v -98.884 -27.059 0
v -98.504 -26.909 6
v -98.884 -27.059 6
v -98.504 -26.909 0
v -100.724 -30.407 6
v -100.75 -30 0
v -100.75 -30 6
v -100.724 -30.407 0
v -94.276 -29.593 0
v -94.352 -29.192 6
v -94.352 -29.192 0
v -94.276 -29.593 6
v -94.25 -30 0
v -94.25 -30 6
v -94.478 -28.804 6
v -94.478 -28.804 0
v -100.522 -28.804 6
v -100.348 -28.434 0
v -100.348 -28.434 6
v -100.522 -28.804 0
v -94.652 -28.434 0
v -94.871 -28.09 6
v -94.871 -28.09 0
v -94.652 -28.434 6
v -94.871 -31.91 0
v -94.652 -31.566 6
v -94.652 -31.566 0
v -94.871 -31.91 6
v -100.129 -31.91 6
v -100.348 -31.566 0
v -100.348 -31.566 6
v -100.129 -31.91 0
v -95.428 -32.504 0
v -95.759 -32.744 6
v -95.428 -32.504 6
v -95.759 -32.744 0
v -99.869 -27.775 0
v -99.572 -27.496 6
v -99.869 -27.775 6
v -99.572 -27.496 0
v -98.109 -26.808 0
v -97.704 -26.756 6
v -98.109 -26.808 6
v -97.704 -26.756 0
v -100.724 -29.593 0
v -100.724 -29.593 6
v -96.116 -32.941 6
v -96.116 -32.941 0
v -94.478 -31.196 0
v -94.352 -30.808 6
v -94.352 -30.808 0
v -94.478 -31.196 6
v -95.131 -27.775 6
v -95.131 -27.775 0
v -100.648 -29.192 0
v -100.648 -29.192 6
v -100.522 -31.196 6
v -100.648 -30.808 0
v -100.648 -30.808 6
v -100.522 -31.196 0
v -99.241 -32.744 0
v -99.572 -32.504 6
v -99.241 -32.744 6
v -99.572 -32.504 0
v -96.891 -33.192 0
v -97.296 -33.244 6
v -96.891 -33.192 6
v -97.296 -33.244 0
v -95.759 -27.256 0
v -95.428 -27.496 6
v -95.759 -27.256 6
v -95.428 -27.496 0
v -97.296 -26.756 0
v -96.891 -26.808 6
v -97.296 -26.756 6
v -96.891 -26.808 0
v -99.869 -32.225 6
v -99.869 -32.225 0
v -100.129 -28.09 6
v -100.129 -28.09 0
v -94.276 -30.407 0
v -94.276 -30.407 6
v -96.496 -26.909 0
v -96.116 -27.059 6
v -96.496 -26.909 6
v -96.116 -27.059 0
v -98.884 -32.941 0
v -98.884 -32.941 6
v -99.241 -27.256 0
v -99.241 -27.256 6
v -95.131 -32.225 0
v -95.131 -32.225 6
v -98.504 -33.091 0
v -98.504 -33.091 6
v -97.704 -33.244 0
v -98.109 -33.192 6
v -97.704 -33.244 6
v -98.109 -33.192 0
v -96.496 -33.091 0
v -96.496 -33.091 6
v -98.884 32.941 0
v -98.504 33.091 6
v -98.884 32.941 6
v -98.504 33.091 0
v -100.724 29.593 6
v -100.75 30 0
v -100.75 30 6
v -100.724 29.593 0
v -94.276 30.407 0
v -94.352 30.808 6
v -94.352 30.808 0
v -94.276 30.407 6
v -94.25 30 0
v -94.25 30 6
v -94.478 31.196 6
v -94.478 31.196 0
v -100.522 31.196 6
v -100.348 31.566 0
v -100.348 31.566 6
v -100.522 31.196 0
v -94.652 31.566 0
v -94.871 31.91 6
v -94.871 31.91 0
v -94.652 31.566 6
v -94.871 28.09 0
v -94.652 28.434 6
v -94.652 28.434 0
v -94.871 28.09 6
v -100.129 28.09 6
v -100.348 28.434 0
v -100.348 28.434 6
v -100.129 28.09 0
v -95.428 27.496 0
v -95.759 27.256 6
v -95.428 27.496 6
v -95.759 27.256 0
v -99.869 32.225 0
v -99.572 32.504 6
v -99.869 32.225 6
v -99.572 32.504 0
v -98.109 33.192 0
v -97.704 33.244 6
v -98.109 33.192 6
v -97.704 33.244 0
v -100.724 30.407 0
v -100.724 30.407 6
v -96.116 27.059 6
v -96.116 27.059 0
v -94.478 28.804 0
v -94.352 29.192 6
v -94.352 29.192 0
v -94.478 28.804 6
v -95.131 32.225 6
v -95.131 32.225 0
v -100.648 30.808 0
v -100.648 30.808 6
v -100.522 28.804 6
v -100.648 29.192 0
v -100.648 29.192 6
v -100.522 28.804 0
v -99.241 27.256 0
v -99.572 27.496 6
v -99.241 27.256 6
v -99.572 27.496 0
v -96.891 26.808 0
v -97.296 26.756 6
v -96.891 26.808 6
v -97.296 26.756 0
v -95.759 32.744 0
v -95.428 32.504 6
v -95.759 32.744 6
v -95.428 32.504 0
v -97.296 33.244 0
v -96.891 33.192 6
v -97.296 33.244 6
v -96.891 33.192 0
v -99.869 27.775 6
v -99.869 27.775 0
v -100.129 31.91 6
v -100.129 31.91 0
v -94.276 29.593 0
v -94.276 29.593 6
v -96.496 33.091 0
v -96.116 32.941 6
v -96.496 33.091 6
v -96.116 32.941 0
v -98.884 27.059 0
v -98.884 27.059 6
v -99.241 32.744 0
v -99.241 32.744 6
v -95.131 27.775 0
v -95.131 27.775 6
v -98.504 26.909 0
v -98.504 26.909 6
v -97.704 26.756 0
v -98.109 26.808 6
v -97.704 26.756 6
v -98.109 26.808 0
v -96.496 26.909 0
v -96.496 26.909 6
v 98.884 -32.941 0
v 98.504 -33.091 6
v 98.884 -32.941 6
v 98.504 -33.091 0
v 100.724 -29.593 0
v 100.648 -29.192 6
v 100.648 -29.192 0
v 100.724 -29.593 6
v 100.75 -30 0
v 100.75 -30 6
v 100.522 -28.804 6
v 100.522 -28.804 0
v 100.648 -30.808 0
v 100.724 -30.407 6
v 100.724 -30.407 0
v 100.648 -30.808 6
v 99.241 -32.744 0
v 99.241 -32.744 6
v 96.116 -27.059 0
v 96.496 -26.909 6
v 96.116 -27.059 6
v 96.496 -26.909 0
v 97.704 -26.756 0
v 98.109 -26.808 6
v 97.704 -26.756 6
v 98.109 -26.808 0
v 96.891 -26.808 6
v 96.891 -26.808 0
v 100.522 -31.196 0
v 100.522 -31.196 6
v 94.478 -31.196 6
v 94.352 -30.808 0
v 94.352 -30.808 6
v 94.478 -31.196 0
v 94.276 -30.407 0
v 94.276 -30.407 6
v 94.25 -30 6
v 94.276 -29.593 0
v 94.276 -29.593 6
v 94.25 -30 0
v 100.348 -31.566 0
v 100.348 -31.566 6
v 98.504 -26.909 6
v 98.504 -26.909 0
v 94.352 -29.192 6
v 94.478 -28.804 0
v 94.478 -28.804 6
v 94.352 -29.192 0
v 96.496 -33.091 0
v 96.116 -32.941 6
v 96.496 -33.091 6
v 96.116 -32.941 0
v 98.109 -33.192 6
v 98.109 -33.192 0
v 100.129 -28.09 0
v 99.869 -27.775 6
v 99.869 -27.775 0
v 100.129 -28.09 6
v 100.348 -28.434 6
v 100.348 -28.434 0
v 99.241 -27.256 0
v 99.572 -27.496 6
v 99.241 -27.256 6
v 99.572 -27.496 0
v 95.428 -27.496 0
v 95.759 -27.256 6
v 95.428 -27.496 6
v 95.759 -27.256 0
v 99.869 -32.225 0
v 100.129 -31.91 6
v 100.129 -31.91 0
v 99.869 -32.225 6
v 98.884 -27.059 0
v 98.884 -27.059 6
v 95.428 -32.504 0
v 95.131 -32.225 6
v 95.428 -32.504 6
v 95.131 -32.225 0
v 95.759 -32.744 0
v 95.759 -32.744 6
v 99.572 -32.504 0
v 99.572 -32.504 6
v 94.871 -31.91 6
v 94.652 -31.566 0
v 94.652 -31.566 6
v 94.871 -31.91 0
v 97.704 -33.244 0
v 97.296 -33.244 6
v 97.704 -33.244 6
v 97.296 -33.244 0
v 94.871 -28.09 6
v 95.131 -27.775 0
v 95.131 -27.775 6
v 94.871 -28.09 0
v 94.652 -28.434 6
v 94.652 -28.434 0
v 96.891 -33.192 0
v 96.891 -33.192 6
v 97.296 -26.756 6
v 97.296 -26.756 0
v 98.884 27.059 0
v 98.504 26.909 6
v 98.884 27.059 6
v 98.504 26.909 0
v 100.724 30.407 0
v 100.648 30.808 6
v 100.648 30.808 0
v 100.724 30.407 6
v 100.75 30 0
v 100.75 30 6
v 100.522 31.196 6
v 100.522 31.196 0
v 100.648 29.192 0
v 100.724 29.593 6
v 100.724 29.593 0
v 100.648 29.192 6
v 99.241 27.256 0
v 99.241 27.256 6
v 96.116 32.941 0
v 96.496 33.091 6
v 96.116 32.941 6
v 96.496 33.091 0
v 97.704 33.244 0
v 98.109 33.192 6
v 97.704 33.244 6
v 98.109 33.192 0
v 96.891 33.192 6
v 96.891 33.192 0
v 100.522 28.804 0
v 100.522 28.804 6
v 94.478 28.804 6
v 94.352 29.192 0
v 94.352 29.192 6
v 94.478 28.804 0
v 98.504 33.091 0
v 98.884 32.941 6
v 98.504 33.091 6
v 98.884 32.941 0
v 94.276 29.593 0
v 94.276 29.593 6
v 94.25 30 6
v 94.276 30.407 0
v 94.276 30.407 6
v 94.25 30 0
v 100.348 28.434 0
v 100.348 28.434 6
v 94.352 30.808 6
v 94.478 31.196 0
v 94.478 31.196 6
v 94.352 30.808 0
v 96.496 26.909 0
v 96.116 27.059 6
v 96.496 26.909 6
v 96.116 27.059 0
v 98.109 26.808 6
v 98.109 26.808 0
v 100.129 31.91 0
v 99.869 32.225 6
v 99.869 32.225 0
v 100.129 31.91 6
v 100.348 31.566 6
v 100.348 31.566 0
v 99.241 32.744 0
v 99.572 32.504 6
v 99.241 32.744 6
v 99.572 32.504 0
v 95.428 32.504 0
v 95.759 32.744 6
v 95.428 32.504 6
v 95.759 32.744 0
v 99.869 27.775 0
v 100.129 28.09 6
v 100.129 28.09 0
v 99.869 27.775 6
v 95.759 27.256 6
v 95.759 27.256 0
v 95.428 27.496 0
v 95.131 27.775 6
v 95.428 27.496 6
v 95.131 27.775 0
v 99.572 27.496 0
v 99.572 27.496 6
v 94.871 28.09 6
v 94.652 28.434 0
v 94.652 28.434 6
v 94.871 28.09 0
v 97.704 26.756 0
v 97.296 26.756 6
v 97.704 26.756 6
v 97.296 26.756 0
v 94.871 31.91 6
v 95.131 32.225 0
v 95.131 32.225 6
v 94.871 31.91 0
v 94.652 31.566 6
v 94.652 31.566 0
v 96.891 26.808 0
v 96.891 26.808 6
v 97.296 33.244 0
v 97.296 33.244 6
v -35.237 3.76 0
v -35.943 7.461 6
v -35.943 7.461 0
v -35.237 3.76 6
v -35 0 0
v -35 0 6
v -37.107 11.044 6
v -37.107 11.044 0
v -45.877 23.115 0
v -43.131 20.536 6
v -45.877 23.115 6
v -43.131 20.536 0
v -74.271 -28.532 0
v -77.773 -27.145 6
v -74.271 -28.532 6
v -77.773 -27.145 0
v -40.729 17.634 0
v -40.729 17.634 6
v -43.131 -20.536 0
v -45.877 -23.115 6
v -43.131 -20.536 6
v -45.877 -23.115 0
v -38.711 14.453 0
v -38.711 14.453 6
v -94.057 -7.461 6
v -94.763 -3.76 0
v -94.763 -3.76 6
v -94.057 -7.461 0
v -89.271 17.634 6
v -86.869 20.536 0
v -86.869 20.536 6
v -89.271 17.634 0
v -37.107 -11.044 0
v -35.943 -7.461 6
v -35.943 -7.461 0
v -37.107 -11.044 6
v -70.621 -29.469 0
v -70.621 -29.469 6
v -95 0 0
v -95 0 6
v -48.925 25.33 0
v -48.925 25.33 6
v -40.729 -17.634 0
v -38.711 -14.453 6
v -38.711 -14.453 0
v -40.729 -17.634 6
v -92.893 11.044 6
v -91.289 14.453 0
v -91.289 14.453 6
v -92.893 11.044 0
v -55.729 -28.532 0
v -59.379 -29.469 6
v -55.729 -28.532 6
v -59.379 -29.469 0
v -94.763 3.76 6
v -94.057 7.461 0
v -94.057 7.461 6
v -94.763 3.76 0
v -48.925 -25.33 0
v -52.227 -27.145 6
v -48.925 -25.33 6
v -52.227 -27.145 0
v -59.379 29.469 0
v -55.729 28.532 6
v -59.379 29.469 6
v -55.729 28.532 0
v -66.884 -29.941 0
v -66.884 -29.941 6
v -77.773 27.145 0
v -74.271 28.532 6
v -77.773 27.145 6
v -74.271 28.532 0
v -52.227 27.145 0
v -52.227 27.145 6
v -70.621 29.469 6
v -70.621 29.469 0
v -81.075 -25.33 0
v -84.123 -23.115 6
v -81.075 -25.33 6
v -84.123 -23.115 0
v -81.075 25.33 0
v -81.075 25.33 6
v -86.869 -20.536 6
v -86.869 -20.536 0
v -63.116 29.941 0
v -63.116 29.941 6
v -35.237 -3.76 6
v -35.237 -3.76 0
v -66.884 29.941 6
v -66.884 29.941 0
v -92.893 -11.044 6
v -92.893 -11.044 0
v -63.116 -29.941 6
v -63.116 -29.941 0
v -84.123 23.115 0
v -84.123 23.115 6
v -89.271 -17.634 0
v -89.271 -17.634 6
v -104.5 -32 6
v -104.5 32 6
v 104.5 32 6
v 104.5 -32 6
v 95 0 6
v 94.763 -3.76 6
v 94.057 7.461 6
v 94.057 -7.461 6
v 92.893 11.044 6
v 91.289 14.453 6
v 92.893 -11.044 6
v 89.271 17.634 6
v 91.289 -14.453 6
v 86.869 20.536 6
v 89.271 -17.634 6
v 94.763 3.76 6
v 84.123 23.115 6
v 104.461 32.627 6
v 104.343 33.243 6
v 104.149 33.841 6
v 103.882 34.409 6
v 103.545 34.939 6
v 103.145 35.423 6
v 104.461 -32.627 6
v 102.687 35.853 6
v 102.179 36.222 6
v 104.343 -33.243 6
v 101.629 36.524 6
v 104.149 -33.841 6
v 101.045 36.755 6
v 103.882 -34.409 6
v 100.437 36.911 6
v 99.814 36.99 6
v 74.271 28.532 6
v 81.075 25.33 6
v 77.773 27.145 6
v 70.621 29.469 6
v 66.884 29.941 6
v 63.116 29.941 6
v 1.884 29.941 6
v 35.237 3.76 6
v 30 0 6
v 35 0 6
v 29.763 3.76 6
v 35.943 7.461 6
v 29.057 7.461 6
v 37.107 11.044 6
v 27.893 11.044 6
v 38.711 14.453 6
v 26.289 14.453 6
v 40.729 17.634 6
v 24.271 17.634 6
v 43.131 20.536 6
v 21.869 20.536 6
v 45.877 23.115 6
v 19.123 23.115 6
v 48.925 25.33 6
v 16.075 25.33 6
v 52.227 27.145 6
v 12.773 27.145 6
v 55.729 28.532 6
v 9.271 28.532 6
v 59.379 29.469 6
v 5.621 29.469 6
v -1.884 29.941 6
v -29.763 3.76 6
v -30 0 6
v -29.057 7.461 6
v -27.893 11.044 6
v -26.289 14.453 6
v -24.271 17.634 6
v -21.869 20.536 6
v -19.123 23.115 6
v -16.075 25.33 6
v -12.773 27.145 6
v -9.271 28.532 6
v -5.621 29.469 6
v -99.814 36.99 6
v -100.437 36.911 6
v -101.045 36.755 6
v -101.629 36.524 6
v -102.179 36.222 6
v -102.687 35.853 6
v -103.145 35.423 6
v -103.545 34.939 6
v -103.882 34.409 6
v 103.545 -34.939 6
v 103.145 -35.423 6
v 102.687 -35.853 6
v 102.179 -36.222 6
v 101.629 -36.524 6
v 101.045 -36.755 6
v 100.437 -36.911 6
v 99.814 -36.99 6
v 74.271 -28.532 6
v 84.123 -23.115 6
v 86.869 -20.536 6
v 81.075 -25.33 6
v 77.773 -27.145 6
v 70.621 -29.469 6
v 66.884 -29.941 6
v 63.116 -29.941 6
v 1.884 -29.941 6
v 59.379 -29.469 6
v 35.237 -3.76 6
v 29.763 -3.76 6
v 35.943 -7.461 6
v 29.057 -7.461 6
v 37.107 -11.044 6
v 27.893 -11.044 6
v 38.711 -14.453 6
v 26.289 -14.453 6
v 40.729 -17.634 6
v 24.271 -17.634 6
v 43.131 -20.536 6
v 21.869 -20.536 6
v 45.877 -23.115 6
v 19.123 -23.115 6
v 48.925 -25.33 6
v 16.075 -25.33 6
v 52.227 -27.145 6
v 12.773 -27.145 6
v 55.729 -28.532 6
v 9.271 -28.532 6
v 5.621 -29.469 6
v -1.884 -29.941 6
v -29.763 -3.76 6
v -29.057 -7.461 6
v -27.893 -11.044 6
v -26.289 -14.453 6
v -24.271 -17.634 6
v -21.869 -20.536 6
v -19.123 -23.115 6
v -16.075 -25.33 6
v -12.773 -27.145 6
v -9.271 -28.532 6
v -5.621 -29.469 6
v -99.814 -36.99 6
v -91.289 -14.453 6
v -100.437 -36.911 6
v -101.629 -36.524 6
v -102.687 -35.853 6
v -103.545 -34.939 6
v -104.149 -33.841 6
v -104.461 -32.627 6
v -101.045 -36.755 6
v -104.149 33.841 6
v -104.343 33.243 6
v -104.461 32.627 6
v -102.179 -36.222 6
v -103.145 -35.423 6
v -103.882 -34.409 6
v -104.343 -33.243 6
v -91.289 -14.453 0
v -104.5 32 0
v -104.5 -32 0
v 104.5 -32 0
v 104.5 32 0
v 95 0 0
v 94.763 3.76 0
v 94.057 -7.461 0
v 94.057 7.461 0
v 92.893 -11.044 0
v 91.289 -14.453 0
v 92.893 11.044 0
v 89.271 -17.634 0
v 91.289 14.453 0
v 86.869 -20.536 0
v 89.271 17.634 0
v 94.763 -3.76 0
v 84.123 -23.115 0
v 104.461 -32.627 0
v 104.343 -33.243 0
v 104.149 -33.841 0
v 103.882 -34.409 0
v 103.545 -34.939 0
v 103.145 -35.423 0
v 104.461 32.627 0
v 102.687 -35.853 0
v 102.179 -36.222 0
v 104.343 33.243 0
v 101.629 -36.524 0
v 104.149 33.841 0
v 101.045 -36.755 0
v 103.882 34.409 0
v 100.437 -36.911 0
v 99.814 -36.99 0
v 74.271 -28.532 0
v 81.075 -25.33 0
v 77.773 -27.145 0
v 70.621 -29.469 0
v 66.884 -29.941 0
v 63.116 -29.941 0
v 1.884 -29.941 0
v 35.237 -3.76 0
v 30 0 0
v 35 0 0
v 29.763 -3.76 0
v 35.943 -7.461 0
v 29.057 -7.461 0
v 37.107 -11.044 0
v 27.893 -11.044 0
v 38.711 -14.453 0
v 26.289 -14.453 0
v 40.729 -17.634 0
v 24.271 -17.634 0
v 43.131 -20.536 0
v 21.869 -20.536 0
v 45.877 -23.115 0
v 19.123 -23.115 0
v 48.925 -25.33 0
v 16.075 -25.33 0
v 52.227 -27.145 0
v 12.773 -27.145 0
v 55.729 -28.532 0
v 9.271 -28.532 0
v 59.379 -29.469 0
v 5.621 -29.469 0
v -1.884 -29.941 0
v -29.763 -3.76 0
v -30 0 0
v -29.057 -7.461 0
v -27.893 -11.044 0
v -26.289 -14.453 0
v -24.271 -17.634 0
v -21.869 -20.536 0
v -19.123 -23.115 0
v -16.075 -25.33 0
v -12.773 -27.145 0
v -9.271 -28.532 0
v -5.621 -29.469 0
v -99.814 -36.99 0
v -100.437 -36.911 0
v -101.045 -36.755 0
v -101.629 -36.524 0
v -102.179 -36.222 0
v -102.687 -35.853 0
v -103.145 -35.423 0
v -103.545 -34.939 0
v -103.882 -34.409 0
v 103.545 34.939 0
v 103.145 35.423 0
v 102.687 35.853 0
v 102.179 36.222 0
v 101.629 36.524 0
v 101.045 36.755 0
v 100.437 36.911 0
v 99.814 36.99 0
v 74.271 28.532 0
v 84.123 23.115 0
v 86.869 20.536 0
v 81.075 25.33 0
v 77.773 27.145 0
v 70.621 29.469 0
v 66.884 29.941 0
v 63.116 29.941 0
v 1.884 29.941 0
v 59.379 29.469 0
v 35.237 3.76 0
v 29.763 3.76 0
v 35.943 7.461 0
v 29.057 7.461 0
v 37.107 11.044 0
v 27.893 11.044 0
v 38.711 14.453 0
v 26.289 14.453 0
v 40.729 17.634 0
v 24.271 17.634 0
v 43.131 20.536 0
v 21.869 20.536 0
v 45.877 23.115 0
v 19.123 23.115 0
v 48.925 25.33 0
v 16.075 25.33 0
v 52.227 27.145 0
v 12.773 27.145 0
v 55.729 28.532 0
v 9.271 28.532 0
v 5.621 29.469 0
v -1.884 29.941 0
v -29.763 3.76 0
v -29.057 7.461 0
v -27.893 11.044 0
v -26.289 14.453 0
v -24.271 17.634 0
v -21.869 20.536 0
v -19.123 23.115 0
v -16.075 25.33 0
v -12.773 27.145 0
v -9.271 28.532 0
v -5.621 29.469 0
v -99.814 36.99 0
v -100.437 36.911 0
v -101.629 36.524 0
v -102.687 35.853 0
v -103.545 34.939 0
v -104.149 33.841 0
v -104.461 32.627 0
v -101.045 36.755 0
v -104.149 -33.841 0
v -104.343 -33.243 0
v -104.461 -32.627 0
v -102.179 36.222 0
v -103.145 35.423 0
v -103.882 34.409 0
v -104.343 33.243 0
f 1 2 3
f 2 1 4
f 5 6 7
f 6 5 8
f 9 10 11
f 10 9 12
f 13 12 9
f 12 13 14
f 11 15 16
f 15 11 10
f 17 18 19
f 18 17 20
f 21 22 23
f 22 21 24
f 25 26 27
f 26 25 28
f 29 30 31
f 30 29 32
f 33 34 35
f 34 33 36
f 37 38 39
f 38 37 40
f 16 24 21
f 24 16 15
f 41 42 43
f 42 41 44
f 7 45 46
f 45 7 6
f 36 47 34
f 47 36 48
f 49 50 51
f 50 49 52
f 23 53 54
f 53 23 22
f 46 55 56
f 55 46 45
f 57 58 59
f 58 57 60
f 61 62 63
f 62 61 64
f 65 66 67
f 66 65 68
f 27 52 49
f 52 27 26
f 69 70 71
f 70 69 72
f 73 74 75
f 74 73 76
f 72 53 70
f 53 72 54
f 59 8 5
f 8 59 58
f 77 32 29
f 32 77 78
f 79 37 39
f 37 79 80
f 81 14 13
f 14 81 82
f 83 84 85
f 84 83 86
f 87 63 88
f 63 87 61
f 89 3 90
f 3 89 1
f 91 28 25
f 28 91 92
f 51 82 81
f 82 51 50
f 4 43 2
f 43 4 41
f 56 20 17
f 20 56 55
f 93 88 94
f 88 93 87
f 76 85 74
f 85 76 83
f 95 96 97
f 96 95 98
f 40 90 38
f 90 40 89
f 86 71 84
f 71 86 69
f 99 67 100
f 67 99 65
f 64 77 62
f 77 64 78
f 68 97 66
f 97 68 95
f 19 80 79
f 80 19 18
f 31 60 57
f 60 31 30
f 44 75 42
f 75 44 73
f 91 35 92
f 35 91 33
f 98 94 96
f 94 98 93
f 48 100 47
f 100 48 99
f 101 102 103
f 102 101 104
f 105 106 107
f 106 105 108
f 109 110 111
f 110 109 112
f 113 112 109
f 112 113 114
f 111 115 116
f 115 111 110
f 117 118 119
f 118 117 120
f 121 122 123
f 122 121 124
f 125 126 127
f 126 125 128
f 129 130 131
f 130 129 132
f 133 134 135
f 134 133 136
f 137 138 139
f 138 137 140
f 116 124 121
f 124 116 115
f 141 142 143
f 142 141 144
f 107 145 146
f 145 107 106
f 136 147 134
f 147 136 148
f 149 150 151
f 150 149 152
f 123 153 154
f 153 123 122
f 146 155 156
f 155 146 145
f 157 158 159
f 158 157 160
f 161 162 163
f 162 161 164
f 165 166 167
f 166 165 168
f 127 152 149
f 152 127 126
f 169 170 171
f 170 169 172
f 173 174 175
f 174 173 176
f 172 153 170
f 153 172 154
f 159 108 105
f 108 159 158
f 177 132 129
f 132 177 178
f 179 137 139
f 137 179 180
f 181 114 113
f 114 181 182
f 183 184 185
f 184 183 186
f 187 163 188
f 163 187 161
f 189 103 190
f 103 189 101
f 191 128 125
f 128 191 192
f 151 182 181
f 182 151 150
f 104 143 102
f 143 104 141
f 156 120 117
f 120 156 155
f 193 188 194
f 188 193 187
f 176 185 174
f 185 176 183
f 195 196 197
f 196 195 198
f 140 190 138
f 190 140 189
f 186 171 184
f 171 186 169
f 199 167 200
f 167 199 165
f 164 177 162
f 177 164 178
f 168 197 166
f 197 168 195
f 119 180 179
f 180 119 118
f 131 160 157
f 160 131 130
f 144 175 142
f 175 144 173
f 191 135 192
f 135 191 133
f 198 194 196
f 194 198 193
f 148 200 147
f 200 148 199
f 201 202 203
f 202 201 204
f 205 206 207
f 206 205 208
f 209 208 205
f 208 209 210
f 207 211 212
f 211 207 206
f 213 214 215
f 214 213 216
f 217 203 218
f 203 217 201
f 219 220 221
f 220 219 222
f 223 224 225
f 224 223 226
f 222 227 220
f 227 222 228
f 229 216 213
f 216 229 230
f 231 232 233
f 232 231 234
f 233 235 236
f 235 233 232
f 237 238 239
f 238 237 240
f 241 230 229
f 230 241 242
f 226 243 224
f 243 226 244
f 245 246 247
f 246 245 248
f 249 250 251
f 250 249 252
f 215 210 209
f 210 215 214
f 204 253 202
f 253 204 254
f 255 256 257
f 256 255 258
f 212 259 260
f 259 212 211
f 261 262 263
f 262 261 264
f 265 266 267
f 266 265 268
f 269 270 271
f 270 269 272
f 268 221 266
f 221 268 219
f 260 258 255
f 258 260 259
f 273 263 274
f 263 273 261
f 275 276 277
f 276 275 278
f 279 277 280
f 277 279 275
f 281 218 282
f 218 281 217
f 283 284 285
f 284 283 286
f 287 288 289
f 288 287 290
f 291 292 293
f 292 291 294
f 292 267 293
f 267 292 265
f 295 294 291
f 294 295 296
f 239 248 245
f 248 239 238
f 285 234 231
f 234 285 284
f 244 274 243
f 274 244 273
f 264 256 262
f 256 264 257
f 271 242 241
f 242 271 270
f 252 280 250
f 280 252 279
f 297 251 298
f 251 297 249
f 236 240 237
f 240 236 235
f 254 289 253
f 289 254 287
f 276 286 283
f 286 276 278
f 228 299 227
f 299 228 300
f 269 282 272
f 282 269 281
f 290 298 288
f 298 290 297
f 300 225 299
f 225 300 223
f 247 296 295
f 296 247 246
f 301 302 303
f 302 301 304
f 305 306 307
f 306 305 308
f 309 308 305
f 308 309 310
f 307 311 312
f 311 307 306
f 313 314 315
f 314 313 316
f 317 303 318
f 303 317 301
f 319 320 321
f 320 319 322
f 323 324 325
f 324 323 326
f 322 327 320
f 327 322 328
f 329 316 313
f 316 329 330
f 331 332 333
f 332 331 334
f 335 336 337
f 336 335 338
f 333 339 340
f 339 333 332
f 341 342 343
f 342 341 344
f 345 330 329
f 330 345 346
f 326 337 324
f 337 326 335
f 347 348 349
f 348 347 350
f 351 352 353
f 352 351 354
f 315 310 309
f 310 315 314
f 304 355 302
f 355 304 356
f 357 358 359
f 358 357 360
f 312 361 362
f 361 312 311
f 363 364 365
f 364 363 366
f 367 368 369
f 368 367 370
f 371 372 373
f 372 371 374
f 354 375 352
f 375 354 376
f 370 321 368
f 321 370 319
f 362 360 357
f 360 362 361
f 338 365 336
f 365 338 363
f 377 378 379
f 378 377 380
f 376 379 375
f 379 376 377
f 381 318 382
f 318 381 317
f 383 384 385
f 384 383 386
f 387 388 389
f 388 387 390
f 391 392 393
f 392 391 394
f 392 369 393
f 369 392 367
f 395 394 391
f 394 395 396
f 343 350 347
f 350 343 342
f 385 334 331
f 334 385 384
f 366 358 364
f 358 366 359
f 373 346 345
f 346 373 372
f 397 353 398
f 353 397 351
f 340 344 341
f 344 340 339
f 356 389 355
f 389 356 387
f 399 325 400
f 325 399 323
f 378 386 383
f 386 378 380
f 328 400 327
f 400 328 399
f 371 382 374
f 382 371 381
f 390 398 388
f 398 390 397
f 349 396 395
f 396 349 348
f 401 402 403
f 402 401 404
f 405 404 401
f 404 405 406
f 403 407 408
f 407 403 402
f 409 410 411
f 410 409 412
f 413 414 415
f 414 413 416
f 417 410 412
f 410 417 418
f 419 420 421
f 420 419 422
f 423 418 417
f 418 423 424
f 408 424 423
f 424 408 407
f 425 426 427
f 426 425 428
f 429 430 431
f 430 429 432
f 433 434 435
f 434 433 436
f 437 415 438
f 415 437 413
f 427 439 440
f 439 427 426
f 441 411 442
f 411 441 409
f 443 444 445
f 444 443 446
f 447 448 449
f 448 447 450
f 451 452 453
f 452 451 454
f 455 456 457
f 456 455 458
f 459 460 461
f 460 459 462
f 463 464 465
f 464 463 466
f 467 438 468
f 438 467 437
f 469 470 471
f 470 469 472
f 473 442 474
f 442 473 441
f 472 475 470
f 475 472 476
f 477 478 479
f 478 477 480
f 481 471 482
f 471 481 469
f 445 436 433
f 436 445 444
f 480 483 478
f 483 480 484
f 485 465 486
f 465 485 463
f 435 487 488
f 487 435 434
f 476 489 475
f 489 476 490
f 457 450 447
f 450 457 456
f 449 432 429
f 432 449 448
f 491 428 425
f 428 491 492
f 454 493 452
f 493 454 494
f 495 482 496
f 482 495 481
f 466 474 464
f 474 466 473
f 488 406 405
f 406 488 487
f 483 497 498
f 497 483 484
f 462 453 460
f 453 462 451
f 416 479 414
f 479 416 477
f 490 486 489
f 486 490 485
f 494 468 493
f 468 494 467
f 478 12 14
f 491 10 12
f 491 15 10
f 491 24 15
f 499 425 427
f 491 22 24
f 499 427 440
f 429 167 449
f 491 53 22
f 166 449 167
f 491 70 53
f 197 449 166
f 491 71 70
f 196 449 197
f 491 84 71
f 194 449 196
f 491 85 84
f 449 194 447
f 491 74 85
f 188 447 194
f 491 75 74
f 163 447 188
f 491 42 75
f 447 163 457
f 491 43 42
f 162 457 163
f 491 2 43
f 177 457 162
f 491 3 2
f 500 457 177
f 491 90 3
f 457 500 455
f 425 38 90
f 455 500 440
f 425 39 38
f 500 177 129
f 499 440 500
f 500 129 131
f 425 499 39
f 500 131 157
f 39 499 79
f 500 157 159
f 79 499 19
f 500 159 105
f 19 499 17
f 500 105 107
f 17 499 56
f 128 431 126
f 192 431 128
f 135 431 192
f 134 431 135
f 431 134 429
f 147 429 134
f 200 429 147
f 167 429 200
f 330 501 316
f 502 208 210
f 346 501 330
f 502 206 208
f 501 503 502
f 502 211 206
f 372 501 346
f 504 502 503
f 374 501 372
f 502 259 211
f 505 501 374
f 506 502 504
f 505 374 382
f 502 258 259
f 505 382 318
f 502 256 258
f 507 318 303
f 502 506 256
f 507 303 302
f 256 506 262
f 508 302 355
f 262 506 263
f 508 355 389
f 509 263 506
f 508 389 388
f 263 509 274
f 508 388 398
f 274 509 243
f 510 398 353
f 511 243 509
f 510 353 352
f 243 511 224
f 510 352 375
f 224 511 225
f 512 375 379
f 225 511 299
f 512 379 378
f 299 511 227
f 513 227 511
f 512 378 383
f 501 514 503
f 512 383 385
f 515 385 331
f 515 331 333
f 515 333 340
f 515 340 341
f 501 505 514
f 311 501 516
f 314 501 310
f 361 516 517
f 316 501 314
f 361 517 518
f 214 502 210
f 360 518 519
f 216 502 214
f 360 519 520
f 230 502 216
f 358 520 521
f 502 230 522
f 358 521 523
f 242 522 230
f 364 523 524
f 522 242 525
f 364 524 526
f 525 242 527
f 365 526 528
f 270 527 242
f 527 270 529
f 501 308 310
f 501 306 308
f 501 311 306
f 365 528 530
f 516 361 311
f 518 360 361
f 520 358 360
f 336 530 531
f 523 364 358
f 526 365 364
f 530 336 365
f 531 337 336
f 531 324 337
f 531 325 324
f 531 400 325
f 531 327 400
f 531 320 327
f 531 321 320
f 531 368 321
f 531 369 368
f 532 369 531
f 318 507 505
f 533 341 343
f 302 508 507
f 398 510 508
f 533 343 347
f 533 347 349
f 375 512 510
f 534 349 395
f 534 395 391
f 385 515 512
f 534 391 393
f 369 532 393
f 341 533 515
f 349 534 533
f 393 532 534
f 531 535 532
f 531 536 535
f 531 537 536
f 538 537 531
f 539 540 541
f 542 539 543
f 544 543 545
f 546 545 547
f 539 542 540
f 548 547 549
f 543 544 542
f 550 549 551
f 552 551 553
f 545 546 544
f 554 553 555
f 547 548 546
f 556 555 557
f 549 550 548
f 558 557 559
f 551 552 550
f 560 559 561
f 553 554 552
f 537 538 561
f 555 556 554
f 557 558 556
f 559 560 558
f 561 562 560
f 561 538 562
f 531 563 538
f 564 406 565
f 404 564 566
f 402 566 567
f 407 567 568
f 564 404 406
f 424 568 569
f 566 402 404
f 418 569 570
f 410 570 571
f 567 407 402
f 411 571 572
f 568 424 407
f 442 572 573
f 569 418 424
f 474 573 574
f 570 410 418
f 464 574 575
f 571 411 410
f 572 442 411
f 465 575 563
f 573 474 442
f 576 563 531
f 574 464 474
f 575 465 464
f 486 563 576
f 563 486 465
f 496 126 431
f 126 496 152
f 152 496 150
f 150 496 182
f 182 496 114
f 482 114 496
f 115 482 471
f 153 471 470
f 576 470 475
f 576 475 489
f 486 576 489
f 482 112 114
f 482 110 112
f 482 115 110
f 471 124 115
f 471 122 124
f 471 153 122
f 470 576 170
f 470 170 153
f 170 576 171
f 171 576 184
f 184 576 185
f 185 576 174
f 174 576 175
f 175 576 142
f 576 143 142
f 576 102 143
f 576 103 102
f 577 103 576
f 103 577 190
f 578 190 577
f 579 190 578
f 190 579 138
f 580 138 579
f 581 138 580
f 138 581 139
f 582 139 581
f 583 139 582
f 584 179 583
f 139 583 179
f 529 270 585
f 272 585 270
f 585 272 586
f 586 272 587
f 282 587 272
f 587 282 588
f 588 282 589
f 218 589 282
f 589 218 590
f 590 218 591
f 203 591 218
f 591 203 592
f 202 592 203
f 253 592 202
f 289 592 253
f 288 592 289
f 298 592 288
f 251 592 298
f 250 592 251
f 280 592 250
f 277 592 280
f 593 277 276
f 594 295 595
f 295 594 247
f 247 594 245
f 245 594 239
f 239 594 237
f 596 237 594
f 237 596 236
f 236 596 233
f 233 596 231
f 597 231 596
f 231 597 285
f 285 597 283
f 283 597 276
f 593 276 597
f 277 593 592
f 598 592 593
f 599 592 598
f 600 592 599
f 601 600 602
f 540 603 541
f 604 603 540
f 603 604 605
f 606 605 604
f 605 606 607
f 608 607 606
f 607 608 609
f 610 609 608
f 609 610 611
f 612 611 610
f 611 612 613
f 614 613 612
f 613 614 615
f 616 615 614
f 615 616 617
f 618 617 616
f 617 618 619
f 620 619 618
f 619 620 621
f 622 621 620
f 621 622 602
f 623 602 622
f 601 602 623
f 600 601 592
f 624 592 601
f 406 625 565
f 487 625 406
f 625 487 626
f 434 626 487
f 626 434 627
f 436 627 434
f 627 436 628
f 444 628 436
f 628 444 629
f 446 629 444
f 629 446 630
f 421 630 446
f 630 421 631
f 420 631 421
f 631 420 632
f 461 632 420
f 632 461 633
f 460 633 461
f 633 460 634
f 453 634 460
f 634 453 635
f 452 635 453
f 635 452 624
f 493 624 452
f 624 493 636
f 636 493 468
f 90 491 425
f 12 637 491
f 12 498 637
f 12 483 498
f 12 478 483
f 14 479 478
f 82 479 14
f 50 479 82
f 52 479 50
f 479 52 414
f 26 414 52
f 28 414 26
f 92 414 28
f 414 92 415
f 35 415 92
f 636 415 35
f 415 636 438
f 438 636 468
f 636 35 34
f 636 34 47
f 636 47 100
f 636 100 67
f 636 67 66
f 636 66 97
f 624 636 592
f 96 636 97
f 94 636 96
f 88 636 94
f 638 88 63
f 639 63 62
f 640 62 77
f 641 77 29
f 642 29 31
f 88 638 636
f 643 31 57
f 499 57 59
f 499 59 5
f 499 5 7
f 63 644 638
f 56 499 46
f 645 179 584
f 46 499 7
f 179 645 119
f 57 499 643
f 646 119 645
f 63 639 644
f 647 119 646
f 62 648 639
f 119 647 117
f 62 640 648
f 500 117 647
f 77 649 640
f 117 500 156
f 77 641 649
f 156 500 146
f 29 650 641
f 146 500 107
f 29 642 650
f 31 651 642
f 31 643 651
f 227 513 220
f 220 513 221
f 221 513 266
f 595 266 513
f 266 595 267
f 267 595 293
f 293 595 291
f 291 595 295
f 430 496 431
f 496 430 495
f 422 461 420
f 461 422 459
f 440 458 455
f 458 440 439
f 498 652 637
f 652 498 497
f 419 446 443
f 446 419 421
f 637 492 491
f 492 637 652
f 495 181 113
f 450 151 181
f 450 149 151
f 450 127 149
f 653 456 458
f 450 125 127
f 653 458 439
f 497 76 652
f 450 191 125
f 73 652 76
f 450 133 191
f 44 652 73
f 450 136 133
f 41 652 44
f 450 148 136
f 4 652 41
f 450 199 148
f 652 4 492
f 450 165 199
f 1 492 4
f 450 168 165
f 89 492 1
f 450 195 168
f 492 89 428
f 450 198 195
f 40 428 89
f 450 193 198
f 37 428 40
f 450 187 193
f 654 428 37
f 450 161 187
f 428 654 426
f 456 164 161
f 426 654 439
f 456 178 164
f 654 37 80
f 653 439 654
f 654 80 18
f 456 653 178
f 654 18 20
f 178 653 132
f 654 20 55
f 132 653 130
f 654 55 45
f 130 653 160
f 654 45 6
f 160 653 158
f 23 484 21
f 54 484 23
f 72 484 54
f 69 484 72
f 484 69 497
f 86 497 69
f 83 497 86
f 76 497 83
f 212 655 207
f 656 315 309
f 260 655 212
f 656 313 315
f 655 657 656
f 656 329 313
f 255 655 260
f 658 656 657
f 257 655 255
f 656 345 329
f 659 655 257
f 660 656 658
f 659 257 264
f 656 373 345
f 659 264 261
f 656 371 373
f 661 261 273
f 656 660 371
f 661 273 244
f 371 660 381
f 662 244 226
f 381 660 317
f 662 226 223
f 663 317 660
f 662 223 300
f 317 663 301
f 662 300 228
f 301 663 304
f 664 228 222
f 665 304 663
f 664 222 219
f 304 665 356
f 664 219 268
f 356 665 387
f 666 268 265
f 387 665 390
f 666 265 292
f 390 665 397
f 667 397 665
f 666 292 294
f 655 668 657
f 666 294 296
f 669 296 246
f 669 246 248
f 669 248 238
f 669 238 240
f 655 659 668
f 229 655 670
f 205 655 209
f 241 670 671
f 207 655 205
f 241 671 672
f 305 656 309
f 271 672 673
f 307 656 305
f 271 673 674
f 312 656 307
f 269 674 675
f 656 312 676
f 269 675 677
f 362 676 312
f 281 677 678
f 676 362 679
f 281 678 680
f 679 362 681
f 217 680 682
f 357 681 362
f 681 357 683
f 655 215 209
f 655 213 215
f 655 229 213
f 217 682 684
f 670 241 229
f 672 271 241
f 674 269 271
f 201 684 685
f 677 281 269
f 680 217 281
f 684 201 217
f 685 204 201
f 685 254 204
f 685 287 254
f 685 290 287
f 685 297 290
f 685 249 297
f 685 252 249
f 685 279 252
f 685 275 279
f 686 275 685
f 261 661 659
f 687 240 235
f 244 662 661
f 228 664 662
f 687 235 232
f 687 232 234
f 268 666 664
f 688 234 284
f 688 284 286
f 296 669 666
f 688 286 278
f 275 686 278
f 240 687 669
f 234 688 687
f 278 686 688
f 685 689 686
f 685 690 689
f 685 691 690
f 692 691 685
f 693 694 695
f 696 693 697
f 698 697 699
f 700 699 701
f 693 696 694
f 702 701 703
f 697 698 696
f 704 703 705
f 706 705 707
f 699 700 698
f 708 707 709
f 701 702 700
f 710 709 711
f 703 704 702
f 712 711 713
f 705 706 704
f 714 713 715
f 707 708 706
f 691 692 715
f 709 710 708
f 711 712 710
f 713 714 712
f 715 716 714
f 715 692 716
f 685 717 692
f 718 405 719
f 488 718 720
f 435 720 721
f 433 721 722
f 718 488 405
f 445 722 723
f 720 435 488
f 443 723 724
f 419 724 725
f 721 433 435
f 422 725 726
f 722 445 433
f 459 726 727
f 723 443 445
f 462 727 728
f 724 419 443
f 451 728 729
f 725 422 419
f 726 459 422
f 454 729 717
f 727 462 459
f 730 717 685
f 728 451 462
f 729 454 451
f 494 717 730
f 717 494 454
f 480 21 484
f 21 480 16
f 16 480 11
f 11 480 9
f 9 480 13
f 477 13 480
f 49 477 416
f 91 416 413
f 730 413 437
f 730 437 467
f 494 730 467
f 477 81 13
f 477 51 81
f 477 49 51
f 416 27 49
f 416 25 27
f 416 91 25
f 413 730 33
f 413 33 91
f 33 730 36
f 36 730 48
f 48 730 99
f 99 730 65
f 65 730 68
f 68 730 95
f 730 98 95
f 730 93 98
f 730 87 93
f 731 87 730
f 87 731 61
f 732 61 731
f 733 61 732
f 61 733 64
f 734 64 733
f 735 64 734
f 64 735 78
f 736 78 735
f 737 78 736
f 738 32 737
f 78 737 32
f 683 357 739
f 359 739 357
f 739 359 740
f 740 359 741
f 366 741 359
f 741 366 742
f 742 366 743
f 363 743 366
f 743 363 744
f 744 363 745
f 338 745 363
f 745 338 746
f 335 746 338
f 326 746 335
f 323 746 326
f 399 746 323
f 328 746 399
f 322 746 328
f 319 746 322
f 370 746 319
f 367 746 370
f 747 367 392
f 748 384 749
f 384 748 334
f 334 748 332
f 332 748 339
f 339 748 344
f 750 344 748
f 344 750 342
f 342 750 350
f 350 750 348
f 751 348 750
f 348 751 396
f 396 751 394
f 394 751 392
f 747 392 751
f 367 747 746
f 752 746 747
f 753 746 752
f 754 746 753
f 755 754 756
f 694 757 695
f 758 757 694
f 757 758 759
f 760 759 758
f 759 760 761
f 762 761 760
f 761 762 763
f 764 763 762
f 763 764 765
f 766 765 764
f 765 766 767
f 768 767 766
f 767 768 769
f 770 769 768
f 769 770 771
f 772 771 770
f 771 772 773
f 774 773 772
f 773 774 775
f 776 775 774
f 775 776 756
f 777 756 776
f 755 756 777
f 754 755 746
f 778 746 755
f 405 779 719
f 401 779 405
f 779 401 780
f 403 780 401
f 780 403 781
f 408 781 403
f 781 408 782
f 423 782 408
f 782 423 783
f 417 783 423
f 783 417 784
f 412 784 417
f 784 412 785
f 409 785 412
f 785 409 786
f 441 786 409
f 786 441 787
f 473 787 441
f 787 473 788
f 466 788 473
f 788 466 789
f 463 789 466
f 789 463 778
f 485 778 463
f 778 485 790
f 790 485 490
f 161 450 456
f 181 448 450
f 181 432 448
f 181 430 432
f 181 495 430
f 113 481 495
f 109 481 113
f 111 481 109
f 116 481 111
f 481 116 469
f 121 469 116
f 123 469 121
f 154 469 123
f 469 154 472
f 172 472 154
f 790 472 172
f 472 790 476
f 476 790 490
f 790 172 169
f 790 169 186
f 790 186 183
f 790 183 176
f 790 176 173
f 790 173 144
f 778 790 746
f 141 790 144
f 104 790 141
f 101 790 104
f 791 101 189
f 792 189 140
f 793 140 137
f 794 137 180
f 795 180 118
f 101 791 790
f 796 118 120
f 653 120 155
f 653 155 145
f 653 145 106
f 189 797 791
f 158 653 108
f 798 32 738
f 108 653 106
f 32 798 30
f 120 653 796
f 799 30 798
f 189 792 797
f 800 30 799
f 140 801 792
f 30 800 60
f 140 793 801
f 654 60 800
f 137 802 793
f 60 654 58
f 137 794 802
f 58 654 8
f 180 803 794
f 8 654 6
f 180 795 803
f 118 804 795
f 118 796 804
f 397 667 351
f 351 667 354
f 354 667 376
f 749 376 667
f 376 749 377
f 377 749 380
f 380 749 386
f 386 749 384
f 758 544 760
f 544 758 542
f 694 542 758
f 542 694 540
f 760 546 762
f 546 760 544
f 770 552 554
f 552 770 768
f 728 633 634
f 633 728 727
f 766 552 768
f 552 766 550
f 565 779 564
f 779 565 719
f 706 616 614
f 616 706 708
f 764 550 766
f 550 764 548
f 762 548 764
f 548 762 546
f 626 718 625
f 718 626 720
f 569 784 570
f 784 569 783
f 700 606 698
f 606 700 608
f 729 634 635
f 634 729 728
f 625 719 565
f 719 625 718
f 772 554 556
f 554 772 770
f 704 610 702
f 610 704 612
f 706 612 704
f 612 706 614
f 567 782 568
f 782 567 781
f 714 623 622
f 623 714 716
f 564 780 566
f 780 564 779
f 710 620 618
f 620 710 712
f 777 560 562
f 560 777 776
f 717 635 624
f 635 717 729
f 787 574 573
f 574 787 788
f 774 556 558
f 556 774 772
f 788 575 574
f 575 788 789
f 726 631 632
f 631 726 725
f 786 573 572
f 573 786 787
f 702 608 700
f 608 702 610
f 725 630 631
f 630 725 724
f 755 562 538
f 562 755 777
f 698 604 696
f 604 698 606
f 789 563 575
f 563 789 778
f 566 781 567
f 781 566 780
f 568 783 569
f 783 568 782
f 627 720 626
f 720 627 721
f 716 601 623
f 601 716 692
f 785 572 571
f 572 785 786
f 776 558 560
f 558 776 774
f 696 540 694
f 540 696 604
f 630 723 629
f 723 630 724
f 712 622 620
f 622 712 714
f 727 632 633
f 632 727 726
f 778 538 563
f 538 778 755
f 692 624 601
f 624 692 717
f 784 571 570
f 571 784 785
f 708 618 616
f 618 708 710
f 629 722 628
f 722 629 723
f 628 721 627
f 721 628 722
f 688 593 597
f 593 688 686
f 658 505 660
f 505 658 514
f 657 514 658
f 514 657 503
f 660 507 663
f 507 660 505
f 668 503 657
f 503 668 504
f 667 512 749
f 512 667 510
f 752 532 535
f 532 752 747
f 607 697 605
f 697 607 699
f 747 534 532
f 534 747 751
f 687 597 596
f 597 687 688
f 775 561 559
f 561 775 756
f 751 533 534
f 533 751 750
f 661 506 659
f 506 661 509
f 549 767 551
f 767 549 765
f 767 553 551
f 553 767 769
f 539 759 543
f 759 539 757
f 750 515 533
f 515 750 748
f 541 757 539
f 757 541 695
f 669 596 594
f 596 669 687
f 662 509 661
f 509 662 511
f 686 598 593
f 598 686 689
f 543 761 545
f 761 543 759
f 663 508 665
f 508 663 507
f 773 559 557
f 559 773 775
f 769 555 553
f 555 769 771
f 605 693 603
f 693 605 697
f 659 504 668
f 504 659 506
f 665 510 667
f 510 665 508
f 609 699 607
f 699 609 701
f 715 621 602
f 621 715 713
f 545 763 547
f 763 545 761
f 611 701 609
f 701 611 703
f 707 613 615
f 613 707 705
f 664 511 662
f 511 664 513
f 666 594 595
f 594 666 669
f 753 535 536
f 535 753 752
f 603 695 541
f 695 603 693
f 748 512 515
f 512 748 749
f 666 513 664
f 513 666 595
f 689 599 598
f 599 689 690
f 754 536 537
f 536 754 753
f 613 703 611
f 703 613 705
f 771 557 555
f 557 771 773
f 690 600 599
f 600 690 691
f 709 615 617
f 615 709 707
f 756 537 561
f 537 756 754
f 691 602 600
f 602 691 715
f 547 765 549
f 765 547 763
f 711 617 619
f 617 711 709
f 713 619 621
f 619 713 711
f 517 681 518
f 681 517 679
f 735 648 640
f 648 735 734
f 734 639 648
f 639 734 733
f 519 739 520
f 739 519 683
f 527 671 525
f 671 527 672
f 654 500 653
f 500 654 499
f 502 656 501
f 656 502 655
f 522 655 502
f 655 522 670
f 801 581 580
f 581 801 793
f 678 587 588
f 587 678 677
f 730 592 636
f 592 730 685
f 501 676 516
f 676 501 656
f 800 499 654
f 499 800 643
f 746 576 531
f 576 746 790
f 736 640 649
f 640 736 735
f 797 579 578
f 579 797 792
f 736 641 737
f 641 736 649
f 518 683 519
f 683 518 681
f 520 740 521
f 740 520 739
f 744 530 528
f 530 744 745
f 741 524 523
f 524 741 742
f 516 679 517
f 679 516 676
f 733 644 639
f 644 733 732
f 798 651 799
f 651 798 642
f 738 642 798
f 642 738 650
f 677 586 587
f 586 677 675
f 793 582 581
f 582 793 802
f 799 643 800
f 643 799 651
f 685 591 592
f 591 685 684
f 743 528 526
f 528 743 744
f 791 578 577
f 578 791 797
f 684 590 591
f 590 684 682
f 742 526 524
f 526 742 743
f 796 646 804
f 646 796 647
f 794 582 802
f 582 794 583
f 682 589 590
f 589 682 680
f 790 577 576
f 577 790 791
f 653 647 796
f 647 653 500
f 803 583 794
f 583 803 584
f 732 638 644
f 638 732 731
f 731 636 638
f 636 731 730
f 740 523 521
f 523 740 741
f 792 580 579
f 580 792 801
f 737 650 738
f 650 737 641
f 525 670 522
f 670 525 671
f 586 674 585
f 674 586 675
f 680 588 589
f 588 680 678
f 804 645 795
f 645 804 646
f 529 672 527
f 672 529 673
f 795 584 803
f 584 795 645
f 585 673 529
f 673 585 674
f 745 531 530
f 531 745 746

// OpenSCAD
$fn = 50;


difference() {
	union() {
		hull() {
			translate(v = [-99.5000000000, 32.0000000000, 0]) {
				cylinder(h = 6, r = 5);
			}
			translate(v = [99.5000000000, 32.0000000000, 0]) {
				cylinder(h = 6, r = 5);
			}
			translate(v = [-99.5000000000, -32.0000000000, 0]) {
				cylinder(h = 6, r = 5);
			}
			translate(v = [99.5000000000, -32.0000000000, 0]) {
				cylinder(h = 6, r = 5);
			}
		}
	}
	union() {
		#translate(v = [-97.5000000000, -30.0000000000, -100.0000000000]) {
			cylinder(h = 200, r = 3.2500000000);
		}
		#translate(v = [-97.5000000000, 30.0000000000, -100.0000000000]) {
			cylinder(h = 200, r = 3.2500000000);
		}
		#translate(v = [97.5000000000, -30.0000000000, -100.0000000000]) {
			cylinder(h = 200, r = 3.2500000000);
		}
		#translate(v = [97.5000000000, 30.0000000000, -100.0000000000]) {
			cylinder(h = 200, r = 3.2500000000);
		}
		#translate(v = [-65.0000000000, 0, 0]) {
			cylinder(h = 6, r = 30.0000000000);
		}
		#cylinder(h = 6, r = 30.0000000000);
		#translate(v = [65.0000000000, 0, 0]) {
			cylinder(h = 6, r = 30.0000000000);
		}
	}
}
